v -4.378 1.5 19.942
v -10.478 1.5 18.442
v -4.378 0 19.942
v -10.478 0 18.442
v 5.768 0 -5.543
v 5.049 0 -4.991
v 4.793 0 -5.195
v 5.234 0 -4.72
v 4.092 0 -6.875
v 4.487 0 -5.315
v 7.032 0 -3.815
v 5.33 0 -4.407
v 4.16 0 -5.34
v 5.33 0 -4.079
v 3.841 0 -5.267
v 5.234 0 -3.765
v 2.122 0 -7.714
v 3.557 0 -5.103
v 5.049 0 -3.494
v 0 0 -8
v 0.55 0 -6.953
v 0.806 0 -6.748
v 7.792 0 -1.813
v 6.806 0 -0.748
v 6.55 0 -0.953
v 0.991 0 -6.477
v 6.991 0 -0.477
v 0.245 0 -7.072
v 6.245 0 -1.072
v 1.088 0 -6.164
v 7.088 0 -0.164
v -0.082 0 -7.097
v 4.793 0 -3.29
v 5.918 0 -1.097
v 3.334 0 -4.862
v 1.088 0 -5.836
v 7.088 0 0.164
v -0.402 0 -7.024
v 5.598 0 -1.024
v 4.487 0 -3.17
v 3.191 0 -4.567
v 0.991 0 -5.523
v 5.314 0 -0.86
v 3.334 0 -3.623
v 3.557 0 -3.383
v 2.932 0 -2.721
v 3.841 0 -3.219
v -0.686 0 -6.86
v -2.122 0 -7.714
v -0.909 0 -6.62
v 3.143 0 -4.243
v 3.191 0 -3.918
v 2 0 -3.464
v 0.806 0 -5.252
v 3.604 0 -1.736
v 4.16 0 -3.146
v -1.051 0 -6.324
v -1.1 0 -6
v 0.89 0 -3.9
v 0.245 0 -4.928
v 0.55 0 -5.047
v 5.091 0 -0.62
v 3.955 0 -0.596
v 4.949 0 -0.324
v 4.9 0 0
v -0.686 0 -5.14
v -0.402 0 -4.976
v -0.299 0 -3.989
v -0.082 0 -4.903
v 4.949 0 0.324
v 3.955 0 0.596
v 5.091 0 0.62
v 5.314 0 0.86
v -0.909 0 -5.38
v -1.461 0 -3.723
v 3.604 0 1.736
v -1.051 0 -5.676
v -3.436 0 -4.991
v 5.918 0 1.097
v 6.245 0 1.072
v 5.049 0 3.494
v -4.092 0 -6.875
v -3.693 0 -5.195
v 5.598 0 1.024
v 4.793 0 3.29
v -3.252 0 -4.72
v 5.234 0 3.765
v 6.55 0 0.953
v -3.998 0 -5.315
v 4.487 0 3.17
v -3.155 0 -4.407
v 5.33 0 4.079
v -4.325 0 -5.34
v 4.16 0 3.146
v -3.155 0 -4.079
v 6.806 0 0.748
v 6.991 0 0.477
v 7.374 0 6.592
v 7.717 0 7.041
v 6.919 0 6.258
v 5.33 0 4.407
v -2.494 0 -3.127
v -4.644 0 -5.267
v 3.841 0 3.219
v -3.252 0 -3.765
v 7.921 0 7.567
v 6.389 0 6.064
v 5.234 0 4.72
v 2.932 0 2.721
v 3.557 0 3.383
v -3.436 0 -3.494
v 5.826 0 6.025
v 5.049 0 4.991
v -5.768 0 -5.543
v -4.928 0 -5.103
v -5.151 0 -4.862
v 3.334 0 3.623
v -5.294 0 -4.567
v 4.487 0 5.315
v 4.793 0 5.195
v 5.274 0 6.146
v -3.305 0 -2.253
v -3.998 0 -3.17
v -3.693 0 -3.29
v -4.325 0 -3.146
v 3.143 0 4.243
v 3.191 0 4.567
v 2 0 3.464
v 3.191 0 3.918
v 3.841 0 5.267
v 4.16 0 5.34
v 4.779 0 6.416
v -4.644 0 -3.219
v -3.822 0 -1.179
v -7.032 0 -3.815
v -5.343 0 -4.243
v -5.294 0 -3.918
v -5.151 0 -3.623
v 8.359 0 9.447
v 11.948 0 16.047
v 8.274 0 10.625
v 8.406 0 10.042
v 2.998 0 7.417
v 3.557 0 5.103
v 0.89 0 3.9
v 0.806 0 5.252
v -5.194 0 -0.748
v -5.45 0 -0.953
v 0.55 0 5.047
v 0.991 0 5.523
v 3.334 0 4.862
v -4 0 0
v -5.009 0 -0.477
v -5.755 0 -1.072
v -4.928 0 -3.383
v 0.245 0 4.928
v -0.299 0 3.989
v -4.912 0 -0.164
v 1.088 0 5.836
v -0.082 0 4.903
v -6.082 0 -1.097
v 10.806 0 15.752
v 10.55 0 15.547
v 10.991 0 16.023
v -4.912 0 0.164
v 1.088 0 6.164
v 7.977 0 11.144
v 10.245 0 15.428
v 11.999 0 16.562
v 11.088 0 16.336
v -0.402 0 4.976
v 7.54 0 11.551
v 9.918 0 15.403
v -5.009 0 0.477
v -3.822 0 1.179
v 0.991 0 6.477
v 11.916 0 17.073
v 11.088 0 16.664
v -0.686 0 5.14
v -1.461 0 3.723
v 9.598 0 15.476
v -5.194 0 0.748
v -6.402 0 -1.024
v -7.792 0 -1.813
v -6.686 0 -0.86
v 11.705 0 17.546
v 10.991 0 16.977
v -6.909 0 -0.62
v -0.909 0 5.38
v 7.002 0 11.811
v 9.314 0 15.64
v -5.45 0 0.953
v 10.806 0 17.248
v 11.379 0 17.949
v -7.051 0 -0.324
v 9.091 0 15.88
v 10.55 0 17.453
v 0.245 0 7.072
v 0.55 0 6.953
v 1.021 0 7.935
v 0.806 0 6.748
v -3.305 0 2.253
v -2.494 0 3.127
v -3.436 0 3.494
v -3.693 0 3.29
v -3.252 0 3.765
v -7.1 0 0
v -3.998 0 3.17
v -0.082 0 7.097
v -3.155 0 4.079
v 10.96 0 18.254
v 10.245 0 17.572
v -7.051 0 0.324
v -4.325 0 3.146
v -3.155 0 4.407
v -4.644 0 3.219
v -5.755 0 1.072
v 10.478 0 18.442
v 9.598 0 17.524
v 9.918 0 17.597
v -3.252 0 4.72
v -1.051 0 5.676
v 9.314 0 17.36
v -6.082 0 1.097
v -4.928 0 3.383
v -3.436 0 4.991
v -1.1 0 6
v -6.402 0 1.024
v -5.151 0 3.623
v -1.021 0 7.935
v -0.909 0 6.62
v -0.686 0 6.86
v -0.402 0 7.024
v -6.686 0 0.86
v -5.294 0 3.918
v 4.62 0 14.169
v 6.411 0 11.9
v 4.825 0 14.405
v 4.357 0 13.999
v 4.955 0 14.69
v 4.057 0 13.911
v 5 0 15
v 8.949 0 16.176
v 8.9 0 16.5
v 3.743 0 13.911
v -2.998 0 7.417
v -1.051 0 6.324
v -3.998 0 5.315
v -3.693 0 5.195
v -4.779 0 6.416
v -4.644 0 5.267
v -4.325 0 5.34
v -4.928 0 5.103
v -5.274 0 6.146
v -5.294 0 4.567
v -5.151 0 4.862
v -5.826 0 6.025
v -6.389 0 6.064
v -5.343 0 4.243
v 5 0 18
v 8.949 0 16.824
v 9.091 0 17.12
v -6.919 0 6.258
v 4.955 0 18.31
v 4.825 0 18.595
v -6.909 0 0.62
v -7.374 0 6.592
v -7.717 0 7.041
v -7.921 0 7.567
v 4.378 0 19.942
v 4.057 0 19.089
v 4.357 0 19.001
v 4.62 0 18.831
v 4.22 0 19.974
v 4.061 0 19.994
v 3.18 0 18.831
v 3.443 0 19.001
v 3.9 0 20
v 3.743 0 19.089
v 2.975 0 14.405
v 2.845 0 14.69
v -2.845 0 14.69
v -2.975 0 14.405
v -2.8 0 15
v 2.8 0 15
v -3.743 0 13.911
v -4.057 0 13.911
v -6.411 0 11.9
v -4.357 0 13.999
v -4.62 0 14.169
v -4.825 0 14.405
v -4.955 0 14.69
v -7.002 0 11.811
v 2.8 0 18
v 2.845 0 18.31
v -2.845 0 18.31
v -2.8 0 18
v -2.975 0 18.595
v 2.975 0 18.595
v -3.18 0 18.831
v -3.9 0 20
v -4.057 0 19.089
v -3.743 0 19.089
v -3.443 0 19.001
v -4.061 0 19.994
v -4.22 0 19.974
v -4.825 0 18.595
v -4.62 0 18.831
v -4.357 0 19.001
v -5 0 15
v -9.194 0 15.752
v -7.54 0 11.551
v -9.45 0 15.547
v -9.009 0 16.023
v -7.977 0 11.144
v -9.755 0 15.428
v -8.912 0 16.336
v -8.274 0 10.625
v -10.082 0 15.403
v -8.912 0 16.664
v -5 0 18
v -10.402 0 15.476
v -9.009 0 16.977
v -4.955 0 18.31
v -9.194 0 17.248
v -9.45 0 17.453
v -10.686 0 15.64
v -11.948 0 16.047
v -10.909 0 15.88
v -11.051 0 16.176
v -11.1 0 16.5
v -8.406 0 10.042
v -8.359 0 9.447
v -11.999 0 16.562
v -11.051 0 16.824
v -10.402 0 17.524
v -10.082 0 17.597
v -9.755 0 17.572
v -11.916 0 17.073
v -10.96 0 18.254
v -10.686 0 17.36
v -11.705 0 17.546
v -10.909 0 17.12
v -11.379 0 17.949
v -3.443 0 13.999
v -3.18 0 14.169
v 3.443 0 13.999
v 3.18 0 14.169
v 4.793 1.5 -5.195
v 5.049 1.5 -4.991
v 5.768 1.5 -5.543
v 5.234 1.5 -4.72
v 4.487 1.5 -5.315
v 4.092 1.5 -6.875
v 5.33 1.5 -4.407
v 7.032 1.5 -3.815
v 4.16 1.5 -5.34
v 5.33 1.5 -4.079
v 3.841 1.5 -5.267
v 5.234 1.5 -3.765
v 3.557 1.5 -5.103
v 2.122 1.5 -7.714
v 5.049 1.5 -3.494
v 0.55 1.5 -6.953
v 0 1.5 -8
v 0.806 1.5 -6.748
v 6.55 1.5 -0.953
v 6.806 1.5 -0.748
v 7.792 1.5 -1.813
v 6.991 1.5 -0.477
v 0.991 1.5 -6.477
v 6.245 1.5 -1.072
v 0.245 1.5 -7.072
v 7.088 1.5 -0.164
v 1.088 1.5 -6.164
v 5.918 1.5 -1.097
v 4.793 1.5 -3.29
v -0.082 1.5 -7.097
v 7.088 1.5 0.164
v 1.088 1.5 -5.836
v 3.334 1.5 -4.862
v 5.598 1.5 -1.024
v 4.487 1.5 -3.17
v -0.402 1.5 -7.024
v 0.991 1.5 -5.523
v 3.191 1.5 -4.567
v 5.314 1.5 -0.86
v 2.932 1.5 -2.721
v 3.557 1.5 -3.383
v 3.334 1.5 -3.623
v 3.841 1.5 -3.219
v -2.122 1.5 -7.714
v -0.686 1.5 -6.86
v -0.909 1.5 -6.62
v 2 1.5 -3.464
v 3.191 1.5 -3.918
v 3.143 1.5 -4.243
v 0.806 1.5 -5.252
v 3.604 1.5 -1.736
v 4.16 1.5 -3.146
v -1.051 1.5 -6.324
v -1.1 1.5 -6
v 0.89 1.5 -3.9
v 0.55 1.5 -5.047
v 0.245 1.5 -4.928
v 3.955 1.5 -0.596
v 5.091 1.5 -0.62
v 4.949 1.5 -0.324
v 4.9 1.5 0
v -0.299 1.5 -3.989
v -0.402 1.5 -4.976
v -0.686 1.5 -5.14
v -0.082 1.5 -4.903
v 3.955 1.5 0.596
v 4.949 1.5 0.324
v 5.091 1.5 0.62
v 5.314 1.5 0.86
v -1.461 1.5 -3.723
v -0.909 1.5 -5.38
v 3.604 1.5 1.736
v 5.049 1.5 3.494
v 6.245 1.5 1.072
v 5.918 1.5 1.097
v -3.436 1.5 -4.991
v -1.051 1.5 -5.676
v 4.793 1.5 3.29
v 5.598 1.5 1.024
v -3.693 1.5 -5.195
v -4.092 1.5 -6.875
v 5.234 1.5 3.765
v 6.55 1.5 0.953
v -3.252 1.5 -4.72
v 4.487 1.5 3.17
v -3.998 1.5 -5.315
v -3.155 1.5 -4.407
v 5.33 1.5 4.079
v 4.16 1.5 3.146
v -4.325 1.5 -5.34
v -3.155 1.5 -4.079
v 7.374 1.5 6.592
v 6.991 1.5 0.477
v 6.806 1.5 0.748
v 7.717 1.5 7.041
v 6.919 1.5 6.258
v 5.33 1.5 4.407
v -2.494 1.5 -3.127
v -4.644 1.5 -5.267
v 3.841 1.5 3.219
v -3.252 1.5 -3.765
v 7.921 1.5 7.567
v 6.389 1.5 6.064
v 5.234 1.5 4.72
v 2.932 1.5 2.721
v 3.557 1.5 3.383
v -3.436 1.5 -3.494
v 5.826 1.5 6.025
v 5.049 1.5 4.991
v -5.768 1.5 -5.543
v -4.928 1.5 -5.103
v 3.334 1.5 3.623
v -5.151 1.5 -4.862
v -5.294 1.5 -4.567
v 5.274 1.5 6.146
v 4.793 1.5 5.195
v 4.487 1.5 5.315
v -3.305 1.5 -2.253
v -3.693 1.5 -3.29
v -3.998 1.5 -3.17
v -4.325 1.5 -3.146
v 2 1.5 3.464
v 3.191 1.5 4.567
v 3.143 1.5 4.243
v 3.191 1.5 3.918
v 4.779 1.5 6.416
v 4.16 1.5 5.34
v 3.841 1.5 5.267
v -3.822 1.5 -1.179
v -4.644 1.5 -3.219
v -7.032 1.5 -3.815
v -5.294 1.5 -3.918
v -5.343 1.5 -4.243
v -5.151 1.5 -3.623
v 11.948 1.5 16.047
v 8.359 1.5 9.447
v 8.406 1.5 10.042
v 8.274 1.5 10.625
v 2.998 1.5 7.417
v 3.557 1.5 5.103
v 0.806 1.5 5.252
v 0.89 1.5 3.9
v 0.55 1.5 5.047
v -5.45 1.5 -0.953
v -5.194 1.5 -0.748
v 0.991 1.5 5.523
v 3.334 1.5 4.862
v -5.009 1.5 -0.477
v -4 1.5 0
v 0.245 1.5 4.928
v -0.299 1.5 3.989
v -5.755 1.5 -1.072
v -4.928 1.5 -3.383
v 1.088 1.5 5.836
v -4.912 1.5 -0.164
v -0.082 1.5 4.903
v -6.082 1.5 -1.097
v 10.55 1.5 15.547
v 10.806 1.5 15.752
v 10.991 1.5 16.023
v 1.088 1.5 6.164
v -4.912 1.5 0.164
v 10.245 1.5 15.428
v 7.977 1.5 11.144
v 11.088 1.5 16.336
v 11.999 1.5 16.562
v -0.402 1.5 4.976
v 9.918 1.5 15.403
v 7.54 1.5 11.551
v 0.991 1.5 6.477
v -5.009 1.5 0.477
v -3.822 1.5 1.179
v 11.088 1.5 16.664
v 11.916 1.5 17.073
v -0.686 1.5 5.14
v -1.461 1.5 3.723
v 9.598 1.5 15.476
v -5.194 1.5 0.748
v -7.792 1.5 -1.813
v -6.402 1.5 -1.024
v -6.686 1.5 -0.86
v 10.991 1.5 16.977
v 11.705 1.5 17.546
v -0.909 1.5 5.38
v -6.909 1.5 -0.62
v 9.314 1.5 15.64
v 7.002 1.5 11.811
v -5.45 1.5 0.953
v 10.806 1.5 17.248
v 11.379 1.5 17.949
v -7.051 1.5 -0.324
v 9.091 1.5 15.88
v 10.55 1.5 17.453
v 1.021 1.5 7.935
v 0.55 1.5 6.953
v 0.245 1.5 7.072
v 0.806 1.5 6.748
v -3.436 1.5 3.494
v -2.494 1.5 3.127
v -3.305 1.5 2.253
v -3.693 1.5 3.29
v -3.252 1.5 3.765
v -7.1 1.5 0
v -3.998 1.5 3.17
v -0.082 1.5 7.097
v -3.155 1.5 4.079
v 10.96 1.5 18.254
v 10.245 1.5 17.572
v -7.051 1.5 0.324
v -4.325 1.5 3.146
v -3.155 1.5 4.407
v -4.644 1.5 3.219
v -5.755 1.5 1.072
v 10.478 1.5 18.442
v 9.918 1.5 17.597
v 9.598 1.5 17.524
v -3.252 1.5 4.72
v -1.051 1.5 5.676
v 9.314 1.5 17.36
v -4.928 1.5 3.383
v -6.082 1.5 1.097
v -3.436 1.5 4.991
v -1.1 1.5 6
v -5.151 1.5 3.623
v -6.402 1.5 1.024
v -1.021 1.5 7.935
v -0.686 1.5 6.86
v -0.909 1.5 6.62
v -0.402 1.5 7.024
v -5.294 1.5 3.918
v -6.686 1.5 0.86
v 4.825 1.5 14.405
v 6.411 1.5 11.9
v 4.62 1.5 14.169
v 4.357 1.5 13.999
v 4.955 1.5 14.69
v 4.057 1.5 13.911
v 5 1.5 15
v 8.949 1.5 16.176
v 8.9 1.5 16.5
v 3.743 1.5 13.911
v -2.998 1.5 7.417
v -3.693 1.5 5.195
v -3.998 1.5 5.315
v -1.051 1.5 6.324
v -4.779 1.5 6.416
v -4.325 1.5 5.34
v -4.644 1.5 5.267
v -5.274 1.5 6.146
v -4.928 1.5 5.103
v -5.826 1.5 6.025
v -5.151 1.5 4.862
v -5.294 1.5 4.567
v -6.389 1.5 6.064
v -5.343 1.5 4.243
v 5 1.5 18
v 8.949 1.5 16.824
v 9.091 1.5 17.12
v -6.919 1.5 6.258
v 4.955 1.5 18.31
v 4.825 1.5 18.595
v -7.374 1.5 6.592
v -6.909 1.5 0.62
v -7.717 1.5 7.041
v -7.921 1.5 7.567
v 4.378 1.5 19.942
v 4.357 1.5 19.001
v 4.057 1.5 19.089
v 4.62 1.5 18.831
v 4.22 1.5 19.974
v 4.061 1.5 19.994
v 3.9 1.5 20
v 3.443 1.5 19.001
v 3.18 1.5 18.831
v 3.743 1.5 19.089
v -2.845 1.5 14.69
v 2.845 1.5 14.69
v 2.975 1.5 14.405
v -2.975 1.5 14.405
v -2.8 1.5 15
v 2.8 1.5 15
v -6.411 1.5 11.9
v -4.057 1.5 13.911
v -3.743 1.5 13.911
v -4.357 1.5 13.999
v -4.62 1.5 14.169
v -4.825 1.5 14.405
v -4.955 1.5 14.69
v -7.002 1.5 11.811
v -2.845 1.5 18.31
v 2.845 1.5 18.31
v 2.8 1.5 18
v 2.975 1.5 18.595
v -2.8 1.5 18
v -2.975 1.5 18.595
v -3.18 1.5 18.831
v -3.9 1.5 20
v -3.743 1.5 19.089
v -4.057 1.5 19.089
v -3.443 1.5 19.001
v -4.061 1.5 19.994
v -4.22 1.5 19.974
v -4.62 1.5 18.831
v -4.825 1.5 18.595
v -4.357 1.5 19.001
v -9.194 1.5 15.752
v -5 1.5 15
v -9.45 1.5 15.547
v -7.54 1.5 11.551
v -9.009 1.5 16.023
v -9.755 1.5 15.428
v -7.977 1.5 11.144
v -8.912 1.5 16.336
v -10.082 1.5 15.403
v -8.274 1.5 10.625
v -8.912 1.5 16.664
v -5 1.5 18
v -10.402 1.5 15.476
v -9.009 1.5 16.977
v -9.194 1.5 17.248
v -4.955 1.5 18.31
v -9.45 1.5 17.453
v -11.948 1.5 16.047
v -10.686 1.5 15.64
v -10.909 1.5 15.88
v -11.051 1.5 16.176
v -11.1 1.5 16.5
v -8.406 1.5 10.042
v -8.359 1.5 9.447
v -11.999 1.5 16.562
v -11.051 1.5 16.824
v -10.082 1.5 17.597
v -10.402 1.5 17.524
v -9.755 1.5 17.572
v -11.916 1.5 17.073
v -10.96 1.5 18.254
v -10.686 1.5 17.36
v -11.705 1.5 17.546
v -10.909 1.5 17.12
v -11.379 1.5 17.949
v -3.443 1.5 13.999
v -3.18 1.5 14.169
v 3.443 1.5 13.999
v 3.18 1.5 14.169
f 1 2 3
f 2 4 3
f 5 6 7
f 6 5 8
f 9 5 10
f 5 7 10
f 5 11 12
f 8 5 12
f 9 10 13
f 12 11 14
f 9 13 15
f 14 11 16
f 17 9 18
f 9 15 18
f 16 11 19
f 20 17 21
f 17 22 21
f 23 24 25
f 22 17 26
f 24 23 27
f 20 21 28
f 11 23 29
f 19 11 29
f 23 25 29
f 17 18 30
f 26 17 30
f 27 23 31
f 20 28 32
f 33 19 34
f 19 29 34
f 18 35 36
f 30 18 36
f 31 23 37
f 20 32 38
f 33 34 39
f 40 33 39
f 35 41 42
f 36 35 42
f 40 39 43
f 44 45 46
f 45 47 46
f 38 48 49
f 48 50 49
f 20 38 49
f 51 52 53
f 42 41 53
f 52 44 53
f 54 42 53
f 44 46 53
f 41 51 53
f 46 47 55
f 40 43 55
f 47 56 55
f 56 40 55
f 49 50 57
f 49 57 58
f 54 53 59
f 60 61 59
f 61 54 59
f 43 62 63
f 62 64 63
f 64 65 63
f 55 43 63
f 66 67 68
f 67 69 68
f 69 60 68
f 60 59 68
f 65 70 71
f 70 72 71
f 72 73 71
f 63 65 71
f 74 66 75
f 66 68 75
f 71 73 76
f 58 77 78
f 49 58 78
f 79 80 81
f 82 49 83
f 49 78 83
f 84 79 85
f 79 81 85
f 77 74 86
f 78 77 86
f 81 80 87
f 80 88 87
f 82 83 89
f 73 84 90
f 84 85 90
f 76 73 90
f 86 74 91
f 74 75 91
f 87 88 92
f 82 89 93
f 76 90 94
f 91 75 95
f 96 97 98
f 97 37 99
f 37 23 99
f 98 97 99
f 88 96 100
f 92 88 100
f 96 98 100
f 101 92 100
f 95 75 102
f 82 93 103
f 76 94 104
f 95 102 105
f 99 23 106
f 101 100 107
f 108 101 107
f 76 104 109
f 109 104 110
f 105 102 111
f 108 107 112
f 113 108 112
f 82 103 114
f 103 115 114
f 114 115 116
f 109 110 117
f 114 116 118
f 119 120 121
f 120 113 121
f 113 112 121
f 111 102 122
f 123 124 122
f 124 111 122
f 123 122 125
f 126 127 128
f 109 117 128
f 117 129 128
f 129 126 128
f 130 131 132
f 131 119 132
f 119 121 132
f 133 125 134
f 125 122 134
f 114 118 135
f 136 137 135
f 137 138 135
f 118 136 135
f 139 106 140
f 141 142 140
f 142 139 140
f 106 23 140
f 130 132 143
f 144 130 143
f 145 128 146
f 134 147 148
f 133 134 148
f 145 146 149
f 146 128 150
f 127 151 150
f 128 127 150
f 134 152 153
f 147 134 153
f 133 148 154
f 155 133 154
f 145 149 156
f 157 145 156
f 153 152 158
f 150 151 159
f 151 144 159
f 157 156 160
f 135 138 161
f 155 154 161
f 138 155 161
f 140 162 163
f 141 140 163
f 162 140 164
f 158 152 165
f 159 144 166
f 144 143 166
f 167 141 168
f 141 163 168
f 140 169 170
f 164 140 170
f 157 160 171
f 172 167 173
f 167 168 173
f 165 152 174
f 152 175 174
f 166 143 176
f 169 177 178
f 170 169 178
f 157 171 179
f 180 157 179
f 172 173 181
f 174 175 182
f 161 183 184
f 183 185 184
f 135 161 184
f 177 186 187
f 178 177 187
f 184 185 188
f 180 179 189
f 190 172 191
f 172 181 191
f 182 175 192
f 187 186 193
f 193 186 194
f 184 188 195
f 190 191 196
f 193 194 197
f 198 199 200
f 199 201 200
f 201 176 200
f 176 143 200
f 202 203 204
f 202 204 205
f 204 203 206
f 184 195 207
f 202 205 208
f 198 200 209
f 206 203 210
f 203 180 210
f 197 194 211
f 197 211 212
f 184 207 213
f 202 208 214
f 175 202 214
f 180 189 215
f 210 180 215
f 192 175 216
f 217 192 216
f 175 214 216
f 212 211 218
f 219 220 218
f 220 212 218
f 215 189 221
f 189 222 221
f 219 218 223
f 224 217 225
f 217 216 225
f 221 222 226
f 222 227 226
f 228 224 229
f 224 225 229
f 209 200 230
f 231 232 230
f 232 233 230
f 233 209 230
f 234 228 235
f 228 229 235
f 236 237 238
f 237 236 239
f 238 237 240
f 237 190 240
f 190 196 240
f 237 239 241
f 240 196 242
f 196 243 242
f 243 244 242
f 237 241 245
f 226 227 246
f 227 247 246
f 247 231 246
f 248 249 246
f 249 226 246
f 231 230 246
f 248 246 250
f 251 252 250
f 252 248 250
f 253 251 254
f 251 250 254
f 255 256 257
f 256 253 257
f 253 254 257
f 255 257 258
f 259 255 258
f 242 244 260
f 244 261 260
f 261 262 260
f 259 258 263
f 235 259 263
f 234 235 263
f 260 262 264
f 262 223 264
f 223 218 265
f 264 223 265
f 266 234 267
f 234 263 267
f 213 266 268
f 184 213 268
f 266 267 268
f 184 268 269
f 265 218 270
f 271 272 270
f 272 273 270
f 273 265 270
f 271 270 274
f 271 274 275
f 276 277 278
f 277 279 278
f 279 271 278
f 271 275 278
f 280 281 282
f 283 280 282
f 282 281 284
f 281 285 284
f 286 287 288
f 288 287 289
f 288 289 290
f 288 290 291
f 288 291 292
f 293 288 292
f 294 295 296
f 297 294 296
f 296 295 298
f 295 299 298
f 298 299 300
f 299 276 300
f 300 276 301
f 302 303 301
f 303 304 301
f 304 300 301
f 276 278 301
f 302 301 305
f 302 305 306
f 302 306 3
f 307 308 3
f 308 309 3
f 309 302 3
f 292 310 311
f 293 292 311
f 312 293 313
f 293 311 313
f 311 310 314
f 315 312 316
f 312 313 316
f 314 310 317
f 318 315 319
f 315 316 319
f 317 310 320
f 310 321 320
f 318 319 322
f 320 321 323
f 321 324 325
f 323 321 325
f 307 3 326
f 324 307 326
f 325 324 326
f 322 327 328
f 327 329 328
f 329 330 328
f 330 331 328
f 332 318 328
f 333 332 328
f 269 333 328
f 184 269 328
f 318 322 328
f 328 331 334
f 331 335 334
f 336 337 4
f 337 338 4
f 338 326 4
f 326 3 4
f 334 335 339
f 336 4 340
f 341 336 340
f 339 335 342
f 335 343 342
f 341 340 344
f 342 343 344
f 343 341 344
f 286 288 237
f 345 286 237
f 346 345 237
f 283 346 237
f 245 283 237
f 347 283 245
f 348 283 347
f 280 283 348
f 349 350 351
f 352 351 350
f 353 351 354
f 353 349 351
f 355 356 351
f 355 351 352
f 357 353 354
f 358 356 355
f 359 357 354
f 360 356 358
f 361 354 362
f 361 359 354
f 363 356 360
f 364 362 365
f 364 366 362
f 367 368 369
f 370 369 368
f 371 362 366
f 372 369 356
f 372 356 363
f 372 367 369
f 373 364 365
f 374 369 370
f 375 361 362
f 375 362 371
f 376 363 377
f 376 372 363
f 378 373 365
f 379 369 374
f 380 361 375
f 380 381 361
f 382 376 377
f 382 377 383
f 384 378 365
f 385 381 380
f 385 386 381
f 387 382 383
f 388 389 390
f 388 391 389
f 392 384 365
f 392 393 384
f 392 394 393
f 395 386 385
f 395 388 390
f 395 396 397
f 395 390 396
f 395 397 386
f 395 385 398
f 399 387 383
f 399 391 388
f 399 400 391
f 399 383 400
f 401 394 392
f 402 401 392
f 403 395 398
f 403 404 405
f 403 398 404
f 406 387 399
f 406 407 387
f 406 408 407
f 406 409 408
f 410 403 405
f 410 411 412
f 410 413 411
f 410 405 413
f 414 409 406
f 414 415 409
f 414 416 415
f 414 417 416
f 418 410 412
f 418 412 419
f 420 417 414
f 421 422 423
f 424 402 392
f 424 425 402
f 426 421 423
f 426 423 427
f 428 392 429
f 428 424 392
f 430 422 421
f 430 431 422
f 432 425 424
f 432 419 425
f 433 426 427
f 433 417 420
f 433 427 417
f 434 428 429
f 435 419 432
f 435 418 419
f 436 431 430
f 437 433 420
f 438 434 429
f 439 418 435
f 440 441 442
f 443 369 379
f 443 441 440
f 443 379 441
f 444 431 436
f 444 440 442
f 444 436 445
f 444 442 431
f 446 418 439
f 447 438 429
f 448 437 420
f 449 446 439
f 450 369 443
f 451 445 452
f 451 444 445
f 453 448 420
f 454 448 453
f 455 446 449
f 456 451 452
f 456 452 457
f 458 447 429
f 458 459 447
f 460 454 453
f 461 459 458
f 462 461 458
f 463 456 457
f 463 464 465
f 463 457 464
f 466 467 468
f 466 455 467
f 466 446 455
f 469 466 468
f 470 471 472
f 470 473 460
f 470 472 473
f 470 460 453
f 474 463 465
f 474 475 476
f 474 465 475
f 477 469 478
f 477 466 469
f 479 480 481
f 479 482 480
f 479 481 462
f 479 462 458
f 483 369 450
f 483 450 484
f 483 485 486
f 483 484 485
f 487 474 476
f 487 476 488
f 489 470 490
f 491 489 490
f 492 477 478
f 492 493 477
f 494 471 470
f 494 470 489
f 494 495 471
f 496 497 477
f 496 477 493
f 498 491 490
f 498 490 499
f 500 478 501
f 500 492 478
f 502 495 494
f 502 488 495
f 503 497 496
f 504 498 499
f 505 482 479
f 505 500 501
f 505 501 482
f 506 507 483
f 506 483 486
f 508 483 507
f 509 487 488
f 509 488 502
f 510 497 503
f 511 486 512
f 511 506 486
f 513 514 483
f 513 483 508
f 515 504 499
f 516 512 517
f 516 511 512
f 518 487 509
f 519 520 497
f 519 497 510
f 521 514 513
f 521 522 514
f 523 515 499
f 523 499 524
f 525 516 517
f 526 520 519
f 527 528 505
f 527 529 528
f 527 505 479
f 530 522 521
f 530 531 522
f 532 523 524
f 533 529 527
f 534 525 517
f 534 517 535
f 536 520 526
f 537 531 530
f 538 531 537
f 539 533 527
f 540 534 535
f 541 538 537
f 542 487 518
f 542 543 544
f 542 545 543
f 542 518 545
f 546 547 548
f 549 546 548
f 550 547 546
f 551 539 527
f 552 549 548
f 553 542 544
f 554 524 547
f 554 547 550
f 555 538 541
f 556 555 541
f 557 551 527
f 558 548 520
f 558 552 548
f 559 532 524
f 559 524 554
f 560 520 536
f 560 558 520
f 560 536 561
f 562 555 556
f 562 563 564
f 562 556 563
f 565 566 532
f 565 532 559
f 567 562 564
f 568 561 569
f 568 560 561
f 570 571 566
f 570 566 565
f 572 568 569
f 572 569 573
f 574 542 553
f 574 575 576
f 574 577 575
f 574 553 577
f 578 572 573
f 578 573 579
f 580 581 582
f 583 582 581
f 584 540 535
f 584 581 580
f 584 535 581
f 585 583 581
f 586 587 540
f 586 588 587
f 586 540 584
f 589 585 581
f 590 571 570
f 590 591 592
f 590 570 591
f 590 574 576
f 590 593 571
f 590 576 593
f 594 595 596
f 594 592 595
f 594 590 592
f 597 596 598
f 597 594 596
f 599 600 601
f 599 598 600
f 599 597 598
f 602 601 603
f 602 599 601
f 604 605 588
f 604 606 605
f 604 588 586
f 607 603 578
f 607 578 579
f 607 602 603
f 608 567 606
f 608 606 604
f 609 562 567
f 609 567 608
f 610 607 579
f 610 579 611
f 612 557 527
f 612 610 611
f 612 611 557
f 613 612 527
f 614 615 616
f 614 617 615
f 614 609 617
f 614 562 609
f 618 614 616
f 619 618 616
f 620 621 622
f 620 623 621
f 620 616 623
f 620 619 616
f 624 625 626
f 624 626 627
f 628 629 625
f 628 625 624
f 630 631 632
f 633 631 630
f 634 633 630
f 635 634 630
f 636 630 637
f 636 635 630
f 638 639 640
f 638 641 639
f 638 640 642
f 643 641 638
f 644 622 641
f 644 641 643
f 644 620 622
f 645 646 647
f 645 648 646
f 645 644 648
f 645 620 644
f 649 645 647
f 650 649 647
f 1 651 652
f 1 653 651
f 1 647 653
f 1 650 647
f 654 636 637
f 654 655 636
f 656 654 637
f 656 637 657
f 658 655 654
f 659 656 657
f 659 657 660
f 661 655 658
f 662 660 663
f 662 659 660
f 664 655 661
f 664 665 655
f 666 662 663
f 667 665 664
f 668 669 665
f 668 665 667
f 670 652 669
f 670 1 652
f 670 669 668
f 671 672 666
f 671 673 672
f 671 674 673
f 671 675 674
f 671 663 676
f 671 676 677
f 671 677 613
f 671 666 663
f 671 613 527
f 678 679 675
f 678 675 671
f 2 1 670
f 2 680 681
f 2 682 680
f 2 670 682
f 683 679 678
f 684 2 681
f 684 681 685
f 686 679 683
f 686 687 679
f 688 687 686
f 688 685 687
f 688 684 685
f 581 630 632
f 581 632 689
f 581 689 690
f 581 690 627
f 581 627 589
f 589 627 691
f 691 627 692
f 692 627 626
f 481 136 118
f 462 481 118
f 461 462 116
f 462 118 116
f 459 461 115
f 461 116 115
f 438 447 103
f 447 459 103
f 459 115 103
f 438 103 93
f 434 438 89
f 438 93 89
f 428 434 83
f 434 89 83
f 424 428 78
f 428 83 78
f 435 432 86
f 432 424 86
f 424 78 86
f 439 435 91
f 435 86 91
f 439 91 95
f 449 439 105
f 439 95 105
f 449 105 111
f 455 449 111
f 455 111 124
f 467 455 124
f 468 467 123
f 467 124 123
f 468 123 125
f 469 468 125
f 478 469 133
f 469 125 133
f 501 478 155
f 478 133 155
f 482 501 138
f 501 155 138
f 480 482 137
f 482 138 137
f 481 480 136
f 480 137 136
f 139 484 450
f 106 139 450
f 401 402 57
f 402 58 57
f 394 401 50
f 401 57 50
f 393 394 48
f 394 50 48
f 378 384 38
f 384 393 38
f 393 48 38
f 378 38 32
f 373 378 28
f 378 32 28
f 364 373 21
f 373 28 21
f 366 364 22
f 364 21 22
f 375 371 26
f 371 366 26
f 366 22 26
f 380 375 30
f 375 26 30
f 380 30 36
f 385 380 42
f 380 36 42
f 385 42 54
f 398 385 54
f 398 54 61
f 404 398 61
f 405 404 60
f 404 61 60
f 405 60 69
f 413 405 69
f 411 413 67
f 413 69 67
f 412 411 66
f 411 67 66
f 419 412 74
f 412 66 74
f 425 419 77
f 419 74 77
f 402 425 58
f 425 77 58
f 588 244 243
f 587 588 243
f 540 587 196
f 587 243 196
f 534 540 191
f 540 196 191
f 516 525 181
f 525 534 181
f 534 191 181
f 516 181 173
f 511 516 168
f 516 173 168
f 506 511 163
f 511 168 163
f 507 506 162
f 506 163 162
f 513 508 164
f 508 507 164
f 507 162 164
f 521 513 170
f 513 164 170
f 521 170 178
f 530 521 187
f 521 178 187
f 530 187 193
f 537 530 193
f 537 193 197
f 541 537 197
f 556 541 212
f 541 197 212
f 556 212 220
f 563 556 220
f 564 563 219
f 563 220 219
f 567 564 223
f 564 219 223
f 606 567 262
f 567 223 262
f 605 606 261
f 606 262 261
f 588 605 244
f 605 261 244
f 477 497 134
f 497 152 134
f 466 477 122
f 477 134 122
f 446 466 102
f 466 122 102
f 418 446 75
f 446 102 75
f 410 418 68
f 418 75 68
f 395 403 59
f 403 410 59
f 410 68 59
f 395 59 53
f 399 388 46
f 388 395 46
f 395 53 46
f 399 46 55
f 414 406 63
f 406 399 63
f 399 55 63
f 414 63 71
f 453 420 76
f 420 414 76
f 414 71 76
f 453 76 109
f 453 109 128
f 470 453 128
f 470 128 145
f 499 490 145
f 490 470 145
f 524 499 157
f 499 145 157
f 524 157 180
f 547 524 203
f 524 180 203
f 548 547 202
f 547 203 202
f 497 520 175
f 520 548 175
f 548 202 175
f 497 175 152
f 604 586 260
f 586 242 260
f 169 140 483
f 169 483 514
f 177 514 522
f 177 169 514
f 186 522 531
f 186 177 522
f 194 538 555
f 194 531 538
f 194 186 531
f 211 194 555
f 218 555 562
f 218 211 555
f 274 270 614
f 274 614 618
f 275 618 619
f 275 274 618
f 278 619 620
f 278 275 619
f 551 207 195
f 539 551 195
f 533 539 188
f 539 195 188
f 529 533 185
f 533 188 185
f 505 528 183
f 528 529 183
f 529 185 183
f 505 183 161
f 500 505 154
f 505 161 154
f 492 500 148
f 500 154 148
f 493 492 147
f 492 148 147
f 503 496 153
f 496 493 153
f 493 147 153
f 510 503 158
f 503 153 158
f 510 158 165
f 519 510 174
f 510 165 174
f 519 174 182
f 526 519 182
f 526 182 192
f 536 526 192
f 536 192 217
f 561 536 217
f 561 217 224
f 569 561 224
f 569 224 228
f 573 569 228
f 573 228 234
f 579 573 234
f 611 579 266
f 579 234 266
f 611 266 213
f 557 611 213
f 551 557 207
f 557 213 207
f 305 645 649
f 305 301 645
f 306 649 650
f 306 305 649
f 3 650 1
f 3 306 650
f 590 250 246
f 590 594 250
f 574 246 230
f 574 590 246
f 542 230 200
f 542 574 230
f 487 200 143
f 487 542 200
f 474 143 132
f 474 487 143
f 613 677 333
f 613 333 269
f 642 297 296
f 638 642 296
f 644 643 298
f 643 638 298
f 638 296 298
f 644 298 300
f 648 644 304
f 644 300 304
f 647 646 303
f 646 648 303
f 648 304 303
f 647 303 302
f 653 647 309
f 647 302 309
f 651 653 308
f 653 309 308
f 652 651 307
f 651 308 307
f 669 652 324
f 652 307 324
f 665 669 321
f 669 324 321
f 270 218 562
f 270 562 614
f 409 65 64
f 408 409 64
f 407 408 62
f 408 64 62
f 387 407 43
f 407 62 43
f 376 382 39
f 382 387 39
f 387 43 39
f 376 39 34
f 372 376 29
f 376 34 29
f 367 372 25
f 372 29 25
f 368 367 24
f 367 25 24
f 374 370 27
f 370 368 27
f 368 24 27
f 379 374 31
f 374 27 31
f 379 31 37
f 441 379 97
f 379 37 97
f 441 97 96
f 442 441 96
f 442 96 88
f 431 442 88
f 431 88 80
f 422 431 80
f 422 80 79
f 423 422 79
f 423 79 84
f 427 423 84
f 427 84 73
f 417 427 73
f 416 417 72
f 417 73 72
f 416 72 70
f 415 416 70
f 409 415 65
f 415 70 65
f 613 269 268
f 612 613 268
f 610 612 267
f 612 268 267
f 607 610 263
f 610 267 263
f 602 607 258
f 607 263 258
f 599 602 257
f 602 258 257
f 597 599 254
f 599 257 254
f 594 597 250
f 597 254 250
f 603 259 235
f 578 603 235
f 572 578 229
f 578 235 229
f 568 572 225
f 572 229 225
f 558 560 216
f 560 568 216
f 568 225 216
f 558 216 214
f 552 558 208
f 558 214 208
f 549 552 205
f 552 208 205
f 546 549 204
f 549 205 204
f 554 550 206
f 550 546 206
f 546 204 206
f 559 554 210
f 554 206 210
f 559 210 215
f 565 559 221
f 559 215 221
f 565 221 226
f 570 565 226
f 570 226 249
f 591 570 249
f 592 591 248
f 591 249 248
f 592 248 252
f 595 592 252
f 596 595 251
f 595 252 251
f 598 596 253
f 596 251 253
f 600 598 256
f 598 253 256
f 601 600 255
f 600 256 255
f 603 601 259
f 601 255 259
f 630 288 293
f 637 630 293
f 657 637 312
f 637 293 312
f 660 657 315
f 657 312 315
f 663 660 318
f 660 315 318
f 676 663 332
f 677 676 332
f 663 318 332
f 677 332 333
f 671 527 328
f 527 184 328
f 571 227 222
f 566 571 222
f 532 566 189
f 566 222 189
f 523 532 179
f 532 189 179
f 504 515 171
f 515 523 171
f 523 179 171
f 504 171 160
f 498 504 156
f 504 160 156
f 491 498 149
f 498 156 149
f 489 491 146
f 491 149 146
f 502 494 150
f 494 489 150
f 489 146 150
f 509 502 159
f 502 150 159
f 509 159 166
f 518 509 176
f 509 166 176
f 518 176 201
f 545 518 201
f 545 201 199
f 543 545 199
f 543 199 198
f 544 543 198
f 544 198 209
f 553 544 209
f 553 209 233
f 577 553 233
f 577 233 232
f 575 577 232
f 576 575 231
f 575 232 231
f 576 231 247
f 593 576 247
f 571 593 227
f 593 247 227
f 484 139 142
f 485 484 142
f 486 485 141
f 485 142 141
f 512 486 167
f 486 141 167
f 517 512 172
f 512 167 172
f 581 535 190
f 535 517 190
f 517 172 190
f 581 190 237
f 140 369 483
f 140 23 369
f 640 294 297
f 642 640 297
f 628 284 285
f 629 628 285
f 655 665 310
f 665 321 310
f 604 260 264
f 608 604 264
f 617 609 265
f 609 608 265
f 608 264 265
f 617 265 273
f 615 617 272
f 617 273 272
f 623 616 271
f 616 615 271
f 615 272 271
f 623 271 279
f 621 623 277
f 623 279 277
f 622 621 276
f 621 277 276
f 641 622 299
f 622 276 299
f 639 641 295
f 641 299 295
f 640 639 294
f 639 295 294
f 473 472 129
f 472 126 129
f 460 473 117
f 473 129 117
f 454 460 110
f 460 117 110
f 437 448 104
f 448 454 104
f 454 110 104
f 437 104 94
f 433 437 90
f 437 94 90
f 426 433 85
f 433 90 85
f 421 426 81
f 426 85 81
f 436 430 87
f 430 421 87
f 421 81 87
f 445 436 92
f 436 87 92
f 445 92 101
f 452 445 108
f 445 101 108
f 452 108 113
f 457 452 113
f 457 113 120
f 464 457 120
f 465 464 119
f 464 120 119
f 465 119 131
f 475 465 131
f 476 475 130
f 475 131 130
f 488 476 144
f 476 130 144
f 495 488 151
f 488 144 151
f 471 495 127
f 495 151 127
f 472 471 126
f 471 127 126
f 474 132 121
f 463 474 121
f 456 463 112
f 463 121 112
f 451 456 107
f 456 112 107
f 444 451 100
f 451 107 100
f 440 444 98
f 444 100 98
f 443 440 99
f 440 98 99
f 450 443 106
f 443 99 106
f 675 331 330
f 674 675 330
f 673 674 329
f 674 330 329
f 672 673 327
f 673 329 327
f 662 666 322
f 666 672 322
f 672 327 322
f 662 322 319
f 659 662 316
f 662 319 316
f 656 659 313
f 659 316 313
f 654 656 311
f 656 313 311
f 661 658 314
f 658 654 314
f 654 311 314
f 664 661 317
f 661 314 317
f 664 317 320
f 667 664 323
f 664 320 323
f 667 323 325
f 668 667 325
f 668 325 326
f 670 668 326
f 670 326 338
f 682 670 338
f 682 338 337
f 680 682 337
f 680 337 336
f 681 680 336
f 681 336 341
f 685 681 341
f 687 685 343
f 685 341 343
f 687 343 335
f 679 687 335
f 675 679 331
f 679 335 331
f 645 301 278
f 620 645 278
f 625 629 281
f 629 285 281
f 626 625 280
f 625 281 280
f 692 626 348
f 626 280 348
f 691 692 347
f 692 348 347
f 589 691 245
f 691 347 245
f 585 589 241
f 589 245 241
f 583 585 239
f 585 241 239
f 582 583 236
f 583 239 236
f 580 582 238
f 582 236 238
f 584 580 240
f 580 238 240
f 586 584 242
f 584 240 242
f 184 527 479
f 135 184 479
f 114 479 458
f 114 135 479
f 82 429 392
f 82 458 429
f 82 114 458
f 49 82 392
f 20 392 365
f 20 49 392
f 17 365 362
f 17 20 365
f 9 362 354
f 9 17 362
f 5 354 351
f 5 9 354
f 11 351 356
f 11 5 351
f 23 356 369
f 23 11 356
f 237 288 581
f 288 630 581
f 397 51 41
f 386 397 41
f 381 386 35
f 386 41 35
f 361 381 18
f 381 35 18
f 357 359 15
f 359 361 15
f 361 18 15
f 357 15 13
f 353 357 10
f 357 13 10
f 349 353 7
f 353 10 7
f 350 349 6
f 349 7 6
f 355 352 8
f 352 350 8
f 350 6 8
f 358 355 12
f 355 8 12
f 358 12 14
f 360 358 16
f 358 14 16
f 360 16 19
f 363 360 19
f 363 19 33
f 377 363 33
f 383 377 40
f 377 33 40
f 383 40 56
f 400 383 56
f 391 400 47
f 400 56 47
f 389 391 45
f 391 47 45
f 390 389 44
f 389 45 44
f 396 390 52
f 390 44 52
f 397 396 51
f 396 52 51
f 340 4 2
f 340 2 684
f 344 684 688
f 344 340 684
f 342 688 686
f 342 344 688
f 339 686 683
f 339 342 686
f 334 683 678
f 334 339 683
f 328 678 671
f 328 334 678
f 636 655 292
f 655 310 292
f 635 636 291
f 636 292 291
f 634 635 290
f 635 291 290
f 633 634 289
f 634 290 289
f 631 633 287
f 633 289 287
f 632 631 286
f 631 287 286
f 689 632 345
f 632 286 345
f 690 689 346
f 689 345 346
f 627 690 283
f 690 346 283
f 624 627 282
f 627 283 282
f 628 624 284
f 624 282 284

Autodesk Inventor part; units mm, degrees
ref_plane "YZ Plane" through (0, 0, 0) normal (1, 0, 0) x (0, 1, 0)
ref_plane "XZ Plane" through (0, 0, 0) normal (0, 1, 0) x (-1, 0, 0)
ref_plane "XY Plane" through (0, 0, 0) normal (0, 0, 1) x (1, 0, 0)
sketch "スケッチ1" plane through (0, 0, 0) normal (0, 1, 0) x (-1, 0, 0)
  circle A0 centre (0, 0) radius 4
  circle A1 centre (0, 0) radius 6 construction
  circle A2 centre (0, 0) radius 8
  circle A3 centre (0, -6) radius 1.1
  circle A4 centre (4.2426, -4.2426) radius 1.1
  circle A5 centre (6, 0) radius 1.1
  circle A6 centre (4.2426, 4.2426) radius 1.1
  circle A7 centre (0, 6) radius 1.1
  circle A8 centre (-4.2426, 4.2426) radius 1.1
  circle A9 centre (-6, 0) radius 1.1
  circle A10 centre (-4.2426, -4.2426) radius 1.1
  line L0 (5, 15) -> (-5, 15)
  line L1 (-5, 15) -> (-5, 18)
  line L2 (-5, 18) -> (5, 18)
  line L3 (5, 18) -> (5, 15)
  circle A11 centre (3.9, 15) radius 1.1
  line L4 (0, 15) -> (0, 18) construction
  circle A12 centre (-3.9, 15) radius 1.1
  line L5 (-5, 16.5) -> (5, 16.5) construction
  circle A13 centre (3.9, 18) radius 1.1
  circle A14 centre (-3.9, 18) radius 1.1
  circle A15 centre (-10, 16.5) radius 1.1
  circle A16 centre (10, 16.5) radius 1.1
  circle A17 centre (10, 16.5) radius 2
  circle A18 centre (3.9, 18) radius 2
  circle A19 centre (-10, 16.5) radius 2
  line L6 (7.7918, -1.8132) -> (11.948, 16.0467)
  line L7 (-7.7918, -1.8132) -> (-11.948, 16.0467)
  line L8 (10.4776, 18.4421) -> (4.3776, 19.9421)
  circle A20 centre (-3.9, 18) radius 2
  line L9 (-10.4776, 18.4421) -> (-4.3776, 19.9421)
  line L10 (3.9, 20) -> (-4.1423, 20)
  point P0 (2.8, 18)
  point P1 (5, 18)
  point P2 (2.8, 15)
  point P3 (-2.8, 15)
  point P4 (-5, 15)
  point P5 (-5, 18)
  point P6 (-2.8, 18)
  point P7 (-3.9, 20)
  point P8 (-10.4776, 18.4421)
  dimension "d1" = 12
  dimension "d11" = 2.2
  dimension "d16" = 4
  dimension "d0" = 8
  dimension "d2" = 16
  dimension "d3" = 2.2
  dimension "d6" = 360
  dimension "d8" = 10
  dimension "d9" = 3
  dimension "d10" = 15
  dimension "d12" = 2.2
  dimension "d13" = 5
  dimension "d14" = 4
  dimension "d15" = 4
extrude "押し出し1" add sketch "スケッチ1" along normal blind 1.5 contours A2 | A2 L7 A19 L9 A20 L1 A12 L0 A11 L3 A18 L8 A17 L6 | A19 | A17 | A20 L2 A14 L1 | A18 L3 A13 L2 | L10 A18 L2 A20
sketch "スケッチ2" plane through (0, 1.5, 0) normal (0, 1, 0) x (1, 0, 0)
  line L0 (-8.9295, -11.9) -> (8.9295, -11.9)
  line L1 (8.9295, -11.9) -> (7.0432, -3.7939)
  line L2 (-7.7918, 1.8132) -> (-11.948, -16.0467) projected
  circle A0 centre (0, 0) radius 8
  line L3 (-8.9295, -11.9) -> (-7.0432, -3.7939)
  line L4 (-7.7918, 1.8132) -> (-11.948, -16.0467) projected
  line L5 (11.948, -16.0467) -> (7.7918, 1.8132) projected
  arc A1 (-2.8, -15) -> (-5, -15) centre (-3.9, -15) ccw projected
  point P0 (-3.9, -13.9)
  dimension "d19" = 2
  dimension "d20" = 2
  dimension "d21" = 2
extrude "押し出し2" cut sketch "スケッチ2" against normal through all contours L3 A0 L1 L0
fillet "フィレット1" radius 2 4 edges at (-7.0432, 0.75, 3.7939) (7.0432, 0.75, 3.7939) (8.9295, 0.75, 11.9) (-8.9295, 0.75, 11.9)
equation "\"d21\" = d19"
properties part number "kata" material "アルミニウム 2014-T4"
